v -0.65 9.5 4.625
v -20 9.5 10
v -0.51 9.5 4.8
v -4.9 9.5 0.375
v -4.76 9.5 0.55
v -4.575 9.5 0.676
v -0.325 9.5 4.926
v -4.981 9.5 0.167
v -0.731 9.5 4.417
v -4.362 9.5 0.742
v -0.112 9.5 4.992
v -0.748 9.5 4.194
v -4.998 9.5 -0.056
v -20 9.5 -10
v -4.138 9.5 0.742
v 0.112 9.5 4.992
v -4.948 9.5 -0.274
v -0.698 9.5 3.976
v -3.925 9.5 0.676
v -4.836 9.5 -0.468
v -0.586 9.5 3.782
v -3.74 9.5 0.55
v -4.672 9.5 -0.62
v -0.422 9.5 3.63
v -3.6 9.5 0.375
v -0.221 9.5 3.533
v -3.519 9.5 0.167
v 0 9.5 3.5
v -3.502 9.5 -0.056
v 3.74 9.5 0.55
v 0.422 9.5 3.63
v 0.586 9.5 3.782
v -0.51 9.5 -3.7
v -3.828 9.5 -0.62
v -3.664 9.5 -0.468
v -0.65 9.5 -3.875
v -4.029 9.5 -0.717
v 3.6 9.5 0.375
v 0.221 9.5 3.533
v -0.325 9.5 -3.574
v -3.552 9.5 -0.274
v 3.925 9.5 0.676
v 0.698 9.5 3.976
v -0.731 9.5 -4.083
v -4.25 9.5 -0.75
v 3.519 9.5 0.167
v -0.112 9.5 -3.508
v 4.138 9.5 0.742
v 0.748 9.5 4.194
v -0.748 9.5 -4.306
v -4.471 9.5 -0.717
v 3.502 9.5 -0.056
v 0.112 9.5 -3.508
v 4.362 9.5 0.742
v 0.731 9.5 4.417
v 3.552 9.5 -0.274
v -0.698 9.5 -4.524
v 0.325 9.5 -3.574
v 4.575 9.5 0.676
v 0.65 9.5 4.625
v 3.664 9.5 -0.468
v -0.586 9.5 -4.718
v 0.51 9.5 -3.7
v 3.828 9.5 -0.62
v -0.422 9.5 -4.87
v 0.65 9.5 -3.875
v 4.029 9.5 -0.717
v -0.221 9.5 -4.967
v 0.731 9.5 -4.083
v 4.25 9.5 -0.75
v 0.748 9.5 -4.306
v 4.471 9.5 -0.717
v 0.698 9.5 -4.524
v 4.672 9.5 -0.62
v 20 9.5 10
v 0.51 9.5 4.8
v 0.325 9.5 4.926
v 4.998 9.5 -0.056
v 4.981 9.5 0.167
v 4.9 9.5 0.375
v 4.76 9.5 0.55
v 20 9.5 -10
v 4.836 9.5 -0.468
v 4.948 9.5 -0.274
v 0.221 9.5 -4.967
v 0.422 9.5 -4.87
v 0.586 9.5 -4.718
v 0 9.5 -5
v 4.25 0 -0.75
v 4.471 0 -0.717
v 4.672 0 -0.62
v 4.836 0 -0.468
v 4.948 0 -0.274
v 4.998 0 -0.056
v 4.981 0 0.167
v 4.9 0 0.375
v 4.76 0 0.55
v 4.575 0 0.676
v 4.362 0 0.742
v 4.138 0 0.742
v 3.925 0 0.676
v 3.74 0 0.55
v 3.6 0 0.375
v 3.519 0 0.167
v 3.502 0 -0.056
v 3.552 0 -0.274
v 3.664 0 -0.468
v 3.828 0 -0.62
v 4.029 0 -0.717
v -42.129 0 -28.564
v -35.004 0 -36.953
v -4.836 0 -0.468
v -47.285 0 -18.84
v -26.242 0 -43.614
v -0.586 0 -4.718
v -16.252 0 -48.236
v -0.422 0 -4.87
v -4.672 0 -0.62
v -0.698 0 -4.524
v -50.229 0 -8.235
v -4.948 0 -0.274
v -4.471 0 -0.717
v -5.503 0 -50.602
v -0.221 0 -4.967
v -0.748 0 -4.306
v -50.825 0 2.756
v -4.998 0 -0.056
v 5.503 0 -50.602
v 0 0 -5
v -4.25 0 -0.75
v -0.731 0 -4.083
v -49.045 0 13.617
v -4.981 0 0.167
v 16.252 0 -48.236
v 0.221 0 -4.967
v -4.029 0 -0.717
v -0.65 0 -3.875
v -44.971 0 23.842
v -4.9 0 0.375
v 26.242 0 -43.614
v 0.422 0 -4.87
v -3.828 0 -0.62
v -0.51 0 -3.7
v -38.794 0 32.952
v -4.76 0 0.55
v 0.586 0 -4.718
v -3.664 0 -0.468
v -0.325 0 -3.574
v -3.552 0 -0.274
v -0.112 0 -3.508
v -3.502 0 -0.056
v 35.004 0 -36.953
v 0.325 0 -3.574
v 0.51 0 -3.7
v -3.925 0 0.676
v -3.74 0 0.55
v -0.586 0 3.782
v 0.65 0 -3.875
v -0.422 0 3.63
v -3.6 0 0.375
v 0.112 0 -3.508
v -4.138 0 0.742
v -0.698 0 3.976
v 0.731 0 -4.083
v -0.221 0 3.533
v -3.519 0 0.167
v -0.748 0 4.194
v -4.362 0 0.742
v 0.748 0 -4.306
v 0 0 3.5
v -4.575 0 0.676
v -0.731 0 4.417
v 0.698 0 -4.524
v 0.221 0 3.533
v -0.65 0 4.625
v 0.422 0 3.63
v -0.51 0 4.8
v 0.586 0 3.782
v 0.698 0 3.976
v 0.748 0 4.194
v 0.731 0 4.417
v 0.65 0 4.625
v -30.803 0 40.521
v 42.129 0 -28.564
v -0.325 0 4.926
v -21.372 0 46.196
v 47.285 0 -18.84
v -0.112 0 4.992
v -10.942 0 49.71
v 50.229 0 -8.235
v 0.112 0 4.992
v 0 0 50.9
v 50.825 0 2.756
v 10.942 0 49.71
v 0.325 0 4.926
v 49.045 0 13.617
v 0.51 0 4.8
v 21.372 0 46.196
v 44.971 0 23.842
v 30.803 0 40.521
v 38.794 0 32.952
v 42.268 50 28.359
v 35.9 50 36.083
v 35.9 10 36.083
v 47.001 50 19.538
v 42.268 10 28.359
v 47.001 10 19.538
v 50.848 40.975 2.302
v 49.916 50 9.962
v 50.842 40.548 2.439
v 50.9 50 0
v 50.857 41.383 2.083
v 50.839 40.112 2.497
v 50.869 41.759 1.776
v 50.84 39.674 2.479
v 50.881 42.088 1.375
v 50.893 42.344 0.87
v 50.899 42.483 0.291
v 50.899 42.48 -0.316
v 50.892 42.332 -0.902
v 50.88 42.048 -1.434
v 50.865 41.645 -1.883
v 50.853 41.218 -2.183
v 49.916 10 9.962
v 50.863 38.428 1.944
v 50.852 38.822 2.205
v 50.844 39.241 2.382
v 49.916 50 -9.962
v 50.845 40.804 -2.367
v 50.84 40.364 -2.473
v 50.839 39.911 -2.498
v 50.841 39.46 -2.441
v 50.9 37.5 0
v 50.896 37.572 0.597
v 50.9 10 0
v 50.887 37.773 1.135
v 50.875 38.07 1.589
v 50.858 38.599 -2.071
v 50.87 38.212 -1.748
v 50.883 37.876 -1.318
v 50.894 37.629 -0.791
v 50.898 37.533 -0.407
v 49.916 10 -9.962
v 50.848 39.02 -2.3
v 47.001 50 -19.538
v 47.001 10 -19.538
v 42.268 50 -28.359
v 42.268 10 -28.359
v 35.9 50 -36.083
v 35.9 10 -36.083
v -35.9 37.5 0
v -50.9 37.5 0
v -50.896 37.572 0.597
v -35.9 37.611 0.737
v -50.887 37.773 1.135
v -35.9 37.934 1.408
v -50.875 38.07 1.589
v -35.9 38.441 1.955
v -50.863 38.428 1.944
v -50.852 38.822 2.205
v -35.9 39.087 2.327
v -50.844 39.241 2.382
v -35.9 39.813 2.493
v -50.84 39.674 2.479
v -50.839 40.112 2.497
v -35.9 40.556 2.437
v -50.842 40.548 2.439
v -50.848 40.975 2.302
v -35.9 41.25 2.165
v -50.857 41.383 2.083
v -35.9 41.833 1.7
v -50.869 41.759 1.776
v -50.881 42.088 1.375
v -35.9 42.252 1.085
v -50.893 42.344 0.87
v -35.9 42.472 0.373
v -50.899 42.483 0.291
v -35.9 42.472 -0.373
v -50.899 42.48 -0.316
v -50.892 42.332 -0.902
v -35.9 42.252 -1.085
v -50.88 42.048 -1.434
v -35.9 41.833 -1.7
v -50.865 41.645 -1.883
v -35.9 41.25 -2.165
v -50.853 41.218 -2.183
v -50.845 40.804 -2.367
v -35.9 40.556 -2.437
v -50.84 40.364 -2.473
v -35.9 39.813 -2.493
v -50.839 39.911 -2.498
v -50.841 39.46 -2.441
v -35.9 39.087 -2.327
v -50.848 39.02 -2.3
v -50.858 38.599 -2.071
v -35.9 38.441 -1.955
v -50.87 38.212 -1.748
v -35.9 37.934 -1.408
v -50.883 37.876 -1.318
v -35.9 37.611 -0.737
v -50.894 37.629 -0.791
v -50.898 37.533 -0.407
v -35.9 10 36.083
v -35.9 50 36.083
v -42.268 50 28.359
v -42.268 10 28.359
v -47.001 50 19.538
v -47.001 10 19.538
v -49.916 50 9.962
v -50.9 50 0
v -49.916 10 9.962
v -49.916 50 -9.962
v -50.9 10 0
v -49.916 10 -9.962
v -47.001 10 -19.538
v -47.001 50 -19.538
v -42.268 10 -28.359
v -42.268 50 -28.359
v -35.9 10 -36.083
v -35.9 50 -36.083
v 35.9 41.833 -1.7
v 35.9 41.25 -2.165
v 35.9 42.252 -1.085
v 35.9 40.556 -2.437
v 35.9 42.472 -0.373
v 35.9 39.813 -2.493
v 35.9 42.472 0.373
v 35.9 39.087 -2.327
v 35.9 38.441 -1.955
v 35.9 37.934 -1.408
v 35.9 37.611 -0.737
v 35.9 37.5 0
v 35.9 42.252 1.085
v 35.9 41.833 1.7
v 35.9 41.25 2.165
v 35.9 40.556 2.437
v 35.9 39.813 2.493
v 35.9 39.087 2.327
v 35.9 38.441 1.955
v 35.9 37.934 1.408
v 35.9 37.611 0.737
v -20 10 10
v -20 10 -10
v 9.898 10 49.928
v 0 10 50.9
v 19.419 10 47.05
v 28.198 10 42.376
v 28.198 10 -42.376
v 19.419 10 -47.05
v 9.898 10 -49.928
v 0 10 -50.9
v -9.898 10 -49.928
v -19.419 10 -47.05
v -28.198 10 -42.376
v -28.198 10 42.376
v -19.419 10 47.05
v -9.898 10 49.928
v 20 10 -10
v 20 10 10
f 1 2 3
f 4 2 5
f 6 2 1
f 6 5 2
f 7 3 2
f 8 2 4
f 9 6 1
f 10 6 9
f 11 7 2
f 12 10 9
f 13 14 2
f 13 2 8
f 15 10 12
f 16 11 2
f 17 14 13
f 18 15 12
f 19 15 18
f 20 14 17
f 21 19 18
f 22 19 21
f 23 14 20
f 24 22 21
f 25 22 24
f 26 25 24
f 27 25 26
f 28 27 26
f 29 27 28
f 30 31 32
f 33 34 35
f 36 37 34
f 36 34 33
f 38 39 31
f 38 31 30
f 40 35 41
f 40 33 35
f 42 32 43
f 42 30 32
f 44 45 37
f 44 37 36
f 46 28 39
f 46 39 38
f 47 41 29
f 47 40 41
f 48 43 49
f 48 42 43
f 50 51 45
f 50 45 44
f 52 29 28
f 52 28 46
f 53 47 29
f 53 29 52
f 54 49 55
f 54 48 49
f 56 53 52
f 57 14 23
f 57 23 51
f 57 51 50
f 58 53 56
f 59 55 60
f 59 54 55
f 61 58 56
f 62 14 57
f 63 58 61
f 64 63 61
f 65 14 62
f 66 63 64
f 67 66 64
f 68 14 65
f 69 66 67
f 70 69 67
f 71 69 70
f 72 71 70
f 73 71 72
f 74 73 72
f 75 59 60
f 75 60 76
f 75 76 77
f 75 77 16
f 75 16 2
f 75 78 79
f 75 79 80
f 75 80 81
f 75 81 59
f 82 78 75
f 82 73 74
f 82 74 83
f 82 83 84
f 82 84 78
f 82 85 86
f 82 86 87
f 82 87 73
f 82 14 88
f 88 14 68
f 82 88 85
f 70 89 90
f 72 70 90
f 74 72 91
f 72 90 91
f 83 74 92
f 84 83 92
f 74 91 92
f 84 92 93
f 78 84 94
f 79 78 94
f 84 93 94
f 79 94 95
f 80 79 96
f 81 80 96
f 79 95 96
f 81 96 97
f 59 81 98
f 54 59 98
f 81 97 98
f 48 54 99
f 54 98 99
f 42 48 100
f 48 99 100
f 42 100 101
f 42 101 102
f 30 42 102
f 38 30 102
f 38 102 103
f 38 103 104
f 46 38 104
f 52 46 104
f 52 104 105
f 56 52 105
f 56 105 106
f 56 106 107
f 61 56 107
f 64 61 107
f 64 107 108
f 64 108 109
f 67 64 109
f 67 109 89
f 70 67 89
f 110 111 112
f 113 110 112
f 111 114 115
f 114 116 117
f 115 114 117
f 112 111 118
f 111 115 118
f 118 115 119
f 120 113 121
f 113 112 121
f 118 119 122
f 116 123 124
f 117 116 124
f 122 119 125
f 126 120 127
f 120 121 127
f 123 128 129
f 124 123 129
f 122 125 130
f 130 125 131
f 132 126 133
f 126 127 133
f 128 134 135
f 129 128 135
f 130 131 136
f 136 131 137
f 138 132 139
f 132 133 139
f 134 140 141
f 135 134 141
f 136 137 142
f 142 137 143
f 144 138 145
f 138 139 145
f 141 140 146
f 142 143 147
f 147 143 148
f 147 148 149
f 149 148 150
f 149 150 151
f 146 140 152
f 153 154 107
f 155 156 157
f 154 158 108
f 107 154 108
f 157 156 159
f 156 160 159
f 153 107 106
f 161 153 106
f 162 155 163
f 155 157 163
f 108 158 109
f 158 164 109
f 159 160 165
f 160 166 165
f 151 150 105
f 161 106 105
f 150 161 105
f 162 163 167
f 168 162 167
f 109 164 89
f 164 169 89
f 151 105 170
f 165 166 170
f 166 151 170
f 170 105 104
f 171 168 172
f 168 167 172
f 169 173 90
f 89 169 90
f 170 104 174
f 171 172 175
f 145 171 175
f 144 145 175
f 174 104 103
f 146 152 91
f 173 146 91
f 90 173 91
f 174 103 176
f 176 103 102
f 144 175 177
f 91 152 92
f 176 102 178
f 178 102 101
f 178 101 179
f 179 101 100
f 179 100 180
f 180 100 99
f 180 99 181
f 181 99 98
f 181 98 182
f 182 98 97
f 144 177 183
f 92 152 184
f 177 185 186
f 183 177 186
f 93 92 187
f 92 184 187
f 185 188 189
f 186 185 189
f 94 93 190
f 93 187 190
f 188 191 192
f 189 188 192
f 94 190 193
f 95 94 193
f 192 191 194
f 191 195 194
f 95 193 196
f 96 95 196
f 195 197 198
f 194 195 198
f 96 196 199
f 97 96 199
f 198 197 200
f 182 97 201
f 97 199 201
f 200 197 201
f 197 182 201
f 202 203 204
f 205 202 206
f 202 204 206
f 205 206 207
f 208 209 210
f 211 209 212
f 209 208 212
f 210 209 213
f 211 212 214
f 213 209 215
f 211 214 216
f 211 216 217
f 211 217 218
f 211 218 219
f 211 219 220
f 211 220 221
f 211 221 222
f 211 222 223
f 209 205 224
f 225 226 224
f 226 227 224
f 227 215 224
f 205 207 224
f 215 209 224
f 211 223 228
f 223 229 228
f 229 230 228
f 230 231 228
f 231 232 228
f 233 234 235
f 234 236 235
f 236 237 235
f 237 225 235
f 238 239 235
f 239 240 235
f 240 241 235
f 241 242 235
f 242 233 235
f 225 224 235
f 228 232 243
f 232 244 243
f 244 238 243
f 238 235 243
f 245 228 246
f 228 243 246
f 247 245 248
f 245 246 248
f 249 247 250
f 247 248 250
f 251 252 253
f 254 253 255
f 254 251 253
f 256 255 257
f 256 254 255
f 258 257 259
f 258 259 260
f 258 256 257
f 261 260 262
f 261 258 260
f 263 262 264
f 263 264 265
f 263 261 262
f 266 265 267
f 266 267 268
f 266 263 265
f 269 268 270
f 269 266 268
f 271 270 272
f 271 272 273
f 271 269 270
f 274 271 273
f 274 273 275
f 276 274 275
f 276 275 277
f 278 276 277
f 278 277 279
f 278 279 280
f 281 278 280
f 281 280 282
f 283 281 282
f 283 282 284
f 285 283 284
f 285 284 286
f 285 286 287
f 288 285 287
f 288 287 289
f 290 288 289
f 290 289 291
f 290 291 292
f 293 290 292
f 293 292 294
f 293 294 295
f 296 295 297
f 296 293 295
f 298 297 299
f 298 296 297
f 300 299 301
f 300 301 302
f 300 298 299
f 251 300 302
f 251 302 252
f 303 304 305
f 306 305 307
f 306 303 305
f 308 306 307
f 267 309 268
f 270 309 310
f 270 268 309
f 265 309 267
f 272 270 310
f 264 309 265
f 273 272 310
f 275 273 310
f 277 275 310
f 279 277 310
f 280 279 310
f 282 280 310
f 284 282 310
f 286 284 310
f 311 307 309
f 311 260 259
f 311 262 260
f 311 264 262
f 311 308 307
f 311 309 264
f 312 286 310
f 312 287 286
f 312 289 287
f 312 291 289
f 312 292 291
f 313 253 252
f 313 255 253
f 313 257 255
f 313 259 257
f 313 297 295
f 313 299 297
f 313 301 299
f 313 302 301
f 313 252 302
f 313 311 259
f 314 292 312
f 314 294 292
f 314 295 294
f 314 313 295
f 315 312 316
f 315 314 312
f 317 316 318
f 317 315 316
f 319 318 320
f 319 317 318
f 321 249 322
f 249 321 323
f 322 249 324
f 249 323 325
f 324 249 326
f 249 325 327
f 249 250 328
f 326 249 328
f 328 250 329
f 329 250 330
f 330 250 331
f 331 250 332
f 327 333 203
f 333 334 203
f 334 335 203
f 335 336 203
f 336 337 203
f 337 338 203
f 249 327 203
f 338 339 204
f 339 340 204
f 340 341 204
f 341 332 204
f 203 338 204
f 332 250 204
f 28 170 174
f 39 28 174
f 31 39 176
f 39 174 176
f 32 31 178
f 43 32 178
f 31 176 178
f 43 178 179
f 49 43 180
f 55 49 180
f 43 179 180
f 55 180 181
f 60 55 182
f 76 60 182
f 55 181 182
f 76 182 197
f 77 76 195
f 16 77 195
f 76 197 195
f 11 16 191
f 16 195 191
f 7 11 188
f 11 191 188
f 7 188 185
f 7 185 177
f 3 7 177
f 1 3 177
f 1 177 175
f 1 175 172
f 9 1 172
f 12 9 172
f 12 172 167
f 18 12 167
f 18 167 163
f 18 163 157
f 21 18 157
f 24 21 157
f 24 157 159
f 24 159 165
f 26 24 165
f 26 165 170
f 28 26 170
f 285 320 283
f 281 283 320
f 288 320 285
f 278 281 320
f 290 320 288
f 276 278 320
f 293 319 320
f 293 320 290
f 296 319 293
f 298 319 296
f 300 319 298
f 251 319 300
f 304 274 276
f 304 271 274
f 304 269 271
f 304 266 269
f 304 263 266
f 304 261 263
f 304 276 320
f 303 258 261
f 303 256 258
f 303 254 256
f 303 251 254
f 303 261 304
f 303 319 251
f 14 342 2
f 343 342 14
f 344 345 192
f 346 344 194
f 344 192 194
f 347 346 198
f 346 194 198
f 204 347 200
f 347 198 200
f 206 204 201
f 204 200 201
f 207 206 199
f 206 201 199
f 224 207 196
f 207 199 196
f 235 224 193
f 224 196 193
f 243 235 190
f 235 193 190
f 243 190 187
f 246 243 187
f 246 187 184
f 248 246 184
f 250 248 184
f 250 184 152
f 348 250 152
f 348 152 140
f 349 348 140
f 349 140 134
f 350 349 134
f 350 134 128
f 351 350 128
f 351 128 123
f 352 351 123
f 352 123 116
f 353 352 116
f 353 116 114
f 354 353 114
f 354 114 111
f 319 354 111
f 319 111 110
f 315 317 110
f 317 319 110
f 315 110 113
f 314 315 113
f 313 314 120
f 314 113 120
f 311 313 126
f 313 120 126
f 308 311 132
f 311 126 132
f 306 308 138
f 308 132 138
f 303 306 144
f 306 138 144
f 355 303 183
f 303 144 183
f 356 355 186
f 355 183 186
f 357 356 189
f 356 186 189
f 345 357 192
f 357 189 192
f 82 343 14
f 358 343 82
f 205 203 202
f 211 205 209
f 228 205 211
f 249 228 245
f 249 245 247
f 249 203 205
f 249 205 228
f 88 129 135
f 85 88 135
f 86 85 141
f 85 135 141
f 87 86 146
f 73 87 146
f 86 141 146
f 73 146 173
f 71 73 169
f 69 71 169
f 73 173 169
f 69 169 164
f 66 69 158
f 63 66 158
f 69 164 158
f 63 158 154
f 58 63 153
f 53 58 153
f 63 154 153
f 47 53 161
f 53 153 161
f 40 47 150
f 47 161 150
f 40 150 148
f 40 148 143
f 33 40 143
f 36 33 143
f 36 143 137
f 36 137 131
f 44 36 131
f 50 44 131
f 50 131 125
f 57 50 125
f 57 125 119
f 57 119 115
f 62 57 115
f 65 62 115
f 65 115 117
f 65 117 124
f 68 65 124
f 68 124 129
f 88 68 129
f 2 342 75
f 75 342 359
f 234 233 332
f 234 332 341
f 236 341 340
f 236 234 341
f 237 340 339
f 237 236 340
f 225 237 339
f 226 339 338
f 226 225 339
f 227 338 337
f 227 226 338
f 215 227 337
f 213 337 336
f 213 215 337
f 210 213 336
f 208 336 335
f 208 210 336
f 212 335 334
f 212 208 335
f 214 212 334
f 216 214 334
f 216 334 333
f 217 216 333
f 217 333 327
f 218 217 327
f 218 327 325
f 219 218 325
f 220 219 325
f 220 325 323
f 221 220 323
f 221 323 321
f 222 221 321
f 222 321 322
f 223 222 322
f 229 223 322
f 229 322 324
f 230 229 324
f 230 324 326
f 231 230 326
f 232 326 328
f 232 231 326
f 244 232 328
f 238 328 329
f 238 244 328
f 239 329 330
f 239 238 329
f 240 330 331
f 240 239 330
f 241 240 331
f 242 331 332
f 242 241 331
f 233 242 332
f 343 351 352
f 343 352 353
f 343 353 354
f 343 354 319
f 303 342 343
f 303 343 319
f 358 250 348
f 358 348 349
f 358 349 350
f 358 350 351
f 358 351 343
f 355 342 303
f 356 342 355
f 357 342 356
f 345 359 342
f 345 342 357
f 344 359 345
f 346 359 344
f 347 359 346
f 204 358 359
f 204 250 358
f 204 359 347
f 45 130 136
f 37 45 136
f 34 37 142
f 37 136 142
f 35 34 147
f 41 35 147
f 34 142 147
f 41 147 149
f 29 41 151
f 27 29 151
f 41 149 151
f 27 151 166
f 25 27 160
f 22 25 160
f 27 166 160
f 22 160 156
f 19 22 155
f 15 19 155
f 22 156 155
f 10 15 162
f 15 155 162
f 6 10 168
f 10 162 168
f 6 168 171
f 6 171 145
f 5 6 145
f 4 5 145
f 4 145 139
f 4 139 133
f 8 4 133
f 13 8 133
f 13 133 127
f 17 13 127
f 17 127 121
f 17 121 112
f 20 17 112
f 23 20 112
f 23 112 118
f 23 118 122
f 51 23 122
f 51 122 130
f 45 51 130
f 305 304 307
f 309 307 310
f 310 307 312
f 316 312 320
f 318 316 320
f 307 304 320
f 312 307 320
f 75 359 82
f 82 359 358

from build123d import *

# Parameters (mm, degrees)
SKETCH1_R               = 50.9
BOSS_EXTRUDE1_DEPTH     = 10
BOSS_EXTRUDE2_DEPTH     = 40
SKETCH3_W               = 40
SKETCH3_H               = 20
CUT_EXTRUDE1_DEPTH      = 0.5
CUT_EXTRUDE2_DEPTH      = 113.361247768
CUT_EXTRUDE2_DEPTH_BACK = 113.361247768
SKETCH4_R               = 2.5
SKETCH5_R               = 0.75
CUT_EXTRUDE3_DEPTH      = 88.644851647


with BuildPart() as part:
    # Sketch1 → Boss-Extrude1 (new body)
    with BuildSketch(Plane(origin=(0, 0, 0), x_dir=(1, 0, 0), z_dir=(0, 1, 0))):
        with Locations(Location((0, 0, 0), (0, 0, 270))):
            Circle(SKETCH1_R)
    extrude(amount=BOSS_EXTRUDE1_DEPTH)

    # Sketch2 → Boss-Extrude2 (add)
    with BuildSketch(Plane(origin=(0, 10, 0), x_dir=(1, 0, 0), z_dir=(0, 1, 0))):
        with BuildLine():
            Line((-35.9, 36.083237105), (-35.9, -36.083237105))
            ThreePointArc((-35.9, -36.083237105), (-50.9, 0), (-35.9, 36.083237105))
        make_face()
        with BuildLine():
            Line((35.9, 36.083237105), (35.9, -36.083237105))
            ThreePointArc((35.9, -36.083237105), (50.9, 0), (35.9, 36.083237105))
        make_face()
    extrude(amount=BOSS_EXTRUDE2_DEPTH)

    # Sketch3 → Cut-Extrude1 (cut)
    with BuildSketch(Plane(origin=(0, 10, 0), x_dir=(1, 0, 0), z_dir=(0, 1, 0))):
        Rectangle(SKETCH3_W, SKETCH3_H)
    extrude(amount=-CUT_EXTRUDE1_DEPTH, mode=Mode.SUBTRACT)

    # Sketch4 → Cut-Extrude2 (cut, two sides: drawn at the far end of the back side and taken through both)
    with BuildSketch(Plane.ZY.offset(-35.9).offset(-CUT_EXTRUDE2_DEPTH_BACK)):
        with Locations(Location((0, 40, 0), (0, 0, 270))):
            Circle(SKETCH4_R)
    extrude(amount=CUT_EXTRUDE2_DEPTH + CUT_EXTRUDE2_DEPTH_BACK, mode=Mode.SUBTRACT)

    # Sketch5 → Cut-Extrude3 (cut, through all)
    with BuildSketch(Plane.XZ):
        with Locations(Location((-4.25, 0, 0), (0, 0, 270))):
            Circle(SKETCH5_R)
        with Locations(Location((0, 4.25, 0), (0, 0, 270))):
            Circle(SKETCH5_R)
        with Locations(Location((4.25, 0, 0), (0, 0, 270))):
            Circle(SKETCH5_R)
        with Locations(Location((0, -4.25, 0), (0, 0, 270))):
            Circle(SKETCH5_R)
    extrude(amount=-CUT_EXTRUDE3_DEPTH, mode=Mode.SUBTRACT)


solid = part.part
